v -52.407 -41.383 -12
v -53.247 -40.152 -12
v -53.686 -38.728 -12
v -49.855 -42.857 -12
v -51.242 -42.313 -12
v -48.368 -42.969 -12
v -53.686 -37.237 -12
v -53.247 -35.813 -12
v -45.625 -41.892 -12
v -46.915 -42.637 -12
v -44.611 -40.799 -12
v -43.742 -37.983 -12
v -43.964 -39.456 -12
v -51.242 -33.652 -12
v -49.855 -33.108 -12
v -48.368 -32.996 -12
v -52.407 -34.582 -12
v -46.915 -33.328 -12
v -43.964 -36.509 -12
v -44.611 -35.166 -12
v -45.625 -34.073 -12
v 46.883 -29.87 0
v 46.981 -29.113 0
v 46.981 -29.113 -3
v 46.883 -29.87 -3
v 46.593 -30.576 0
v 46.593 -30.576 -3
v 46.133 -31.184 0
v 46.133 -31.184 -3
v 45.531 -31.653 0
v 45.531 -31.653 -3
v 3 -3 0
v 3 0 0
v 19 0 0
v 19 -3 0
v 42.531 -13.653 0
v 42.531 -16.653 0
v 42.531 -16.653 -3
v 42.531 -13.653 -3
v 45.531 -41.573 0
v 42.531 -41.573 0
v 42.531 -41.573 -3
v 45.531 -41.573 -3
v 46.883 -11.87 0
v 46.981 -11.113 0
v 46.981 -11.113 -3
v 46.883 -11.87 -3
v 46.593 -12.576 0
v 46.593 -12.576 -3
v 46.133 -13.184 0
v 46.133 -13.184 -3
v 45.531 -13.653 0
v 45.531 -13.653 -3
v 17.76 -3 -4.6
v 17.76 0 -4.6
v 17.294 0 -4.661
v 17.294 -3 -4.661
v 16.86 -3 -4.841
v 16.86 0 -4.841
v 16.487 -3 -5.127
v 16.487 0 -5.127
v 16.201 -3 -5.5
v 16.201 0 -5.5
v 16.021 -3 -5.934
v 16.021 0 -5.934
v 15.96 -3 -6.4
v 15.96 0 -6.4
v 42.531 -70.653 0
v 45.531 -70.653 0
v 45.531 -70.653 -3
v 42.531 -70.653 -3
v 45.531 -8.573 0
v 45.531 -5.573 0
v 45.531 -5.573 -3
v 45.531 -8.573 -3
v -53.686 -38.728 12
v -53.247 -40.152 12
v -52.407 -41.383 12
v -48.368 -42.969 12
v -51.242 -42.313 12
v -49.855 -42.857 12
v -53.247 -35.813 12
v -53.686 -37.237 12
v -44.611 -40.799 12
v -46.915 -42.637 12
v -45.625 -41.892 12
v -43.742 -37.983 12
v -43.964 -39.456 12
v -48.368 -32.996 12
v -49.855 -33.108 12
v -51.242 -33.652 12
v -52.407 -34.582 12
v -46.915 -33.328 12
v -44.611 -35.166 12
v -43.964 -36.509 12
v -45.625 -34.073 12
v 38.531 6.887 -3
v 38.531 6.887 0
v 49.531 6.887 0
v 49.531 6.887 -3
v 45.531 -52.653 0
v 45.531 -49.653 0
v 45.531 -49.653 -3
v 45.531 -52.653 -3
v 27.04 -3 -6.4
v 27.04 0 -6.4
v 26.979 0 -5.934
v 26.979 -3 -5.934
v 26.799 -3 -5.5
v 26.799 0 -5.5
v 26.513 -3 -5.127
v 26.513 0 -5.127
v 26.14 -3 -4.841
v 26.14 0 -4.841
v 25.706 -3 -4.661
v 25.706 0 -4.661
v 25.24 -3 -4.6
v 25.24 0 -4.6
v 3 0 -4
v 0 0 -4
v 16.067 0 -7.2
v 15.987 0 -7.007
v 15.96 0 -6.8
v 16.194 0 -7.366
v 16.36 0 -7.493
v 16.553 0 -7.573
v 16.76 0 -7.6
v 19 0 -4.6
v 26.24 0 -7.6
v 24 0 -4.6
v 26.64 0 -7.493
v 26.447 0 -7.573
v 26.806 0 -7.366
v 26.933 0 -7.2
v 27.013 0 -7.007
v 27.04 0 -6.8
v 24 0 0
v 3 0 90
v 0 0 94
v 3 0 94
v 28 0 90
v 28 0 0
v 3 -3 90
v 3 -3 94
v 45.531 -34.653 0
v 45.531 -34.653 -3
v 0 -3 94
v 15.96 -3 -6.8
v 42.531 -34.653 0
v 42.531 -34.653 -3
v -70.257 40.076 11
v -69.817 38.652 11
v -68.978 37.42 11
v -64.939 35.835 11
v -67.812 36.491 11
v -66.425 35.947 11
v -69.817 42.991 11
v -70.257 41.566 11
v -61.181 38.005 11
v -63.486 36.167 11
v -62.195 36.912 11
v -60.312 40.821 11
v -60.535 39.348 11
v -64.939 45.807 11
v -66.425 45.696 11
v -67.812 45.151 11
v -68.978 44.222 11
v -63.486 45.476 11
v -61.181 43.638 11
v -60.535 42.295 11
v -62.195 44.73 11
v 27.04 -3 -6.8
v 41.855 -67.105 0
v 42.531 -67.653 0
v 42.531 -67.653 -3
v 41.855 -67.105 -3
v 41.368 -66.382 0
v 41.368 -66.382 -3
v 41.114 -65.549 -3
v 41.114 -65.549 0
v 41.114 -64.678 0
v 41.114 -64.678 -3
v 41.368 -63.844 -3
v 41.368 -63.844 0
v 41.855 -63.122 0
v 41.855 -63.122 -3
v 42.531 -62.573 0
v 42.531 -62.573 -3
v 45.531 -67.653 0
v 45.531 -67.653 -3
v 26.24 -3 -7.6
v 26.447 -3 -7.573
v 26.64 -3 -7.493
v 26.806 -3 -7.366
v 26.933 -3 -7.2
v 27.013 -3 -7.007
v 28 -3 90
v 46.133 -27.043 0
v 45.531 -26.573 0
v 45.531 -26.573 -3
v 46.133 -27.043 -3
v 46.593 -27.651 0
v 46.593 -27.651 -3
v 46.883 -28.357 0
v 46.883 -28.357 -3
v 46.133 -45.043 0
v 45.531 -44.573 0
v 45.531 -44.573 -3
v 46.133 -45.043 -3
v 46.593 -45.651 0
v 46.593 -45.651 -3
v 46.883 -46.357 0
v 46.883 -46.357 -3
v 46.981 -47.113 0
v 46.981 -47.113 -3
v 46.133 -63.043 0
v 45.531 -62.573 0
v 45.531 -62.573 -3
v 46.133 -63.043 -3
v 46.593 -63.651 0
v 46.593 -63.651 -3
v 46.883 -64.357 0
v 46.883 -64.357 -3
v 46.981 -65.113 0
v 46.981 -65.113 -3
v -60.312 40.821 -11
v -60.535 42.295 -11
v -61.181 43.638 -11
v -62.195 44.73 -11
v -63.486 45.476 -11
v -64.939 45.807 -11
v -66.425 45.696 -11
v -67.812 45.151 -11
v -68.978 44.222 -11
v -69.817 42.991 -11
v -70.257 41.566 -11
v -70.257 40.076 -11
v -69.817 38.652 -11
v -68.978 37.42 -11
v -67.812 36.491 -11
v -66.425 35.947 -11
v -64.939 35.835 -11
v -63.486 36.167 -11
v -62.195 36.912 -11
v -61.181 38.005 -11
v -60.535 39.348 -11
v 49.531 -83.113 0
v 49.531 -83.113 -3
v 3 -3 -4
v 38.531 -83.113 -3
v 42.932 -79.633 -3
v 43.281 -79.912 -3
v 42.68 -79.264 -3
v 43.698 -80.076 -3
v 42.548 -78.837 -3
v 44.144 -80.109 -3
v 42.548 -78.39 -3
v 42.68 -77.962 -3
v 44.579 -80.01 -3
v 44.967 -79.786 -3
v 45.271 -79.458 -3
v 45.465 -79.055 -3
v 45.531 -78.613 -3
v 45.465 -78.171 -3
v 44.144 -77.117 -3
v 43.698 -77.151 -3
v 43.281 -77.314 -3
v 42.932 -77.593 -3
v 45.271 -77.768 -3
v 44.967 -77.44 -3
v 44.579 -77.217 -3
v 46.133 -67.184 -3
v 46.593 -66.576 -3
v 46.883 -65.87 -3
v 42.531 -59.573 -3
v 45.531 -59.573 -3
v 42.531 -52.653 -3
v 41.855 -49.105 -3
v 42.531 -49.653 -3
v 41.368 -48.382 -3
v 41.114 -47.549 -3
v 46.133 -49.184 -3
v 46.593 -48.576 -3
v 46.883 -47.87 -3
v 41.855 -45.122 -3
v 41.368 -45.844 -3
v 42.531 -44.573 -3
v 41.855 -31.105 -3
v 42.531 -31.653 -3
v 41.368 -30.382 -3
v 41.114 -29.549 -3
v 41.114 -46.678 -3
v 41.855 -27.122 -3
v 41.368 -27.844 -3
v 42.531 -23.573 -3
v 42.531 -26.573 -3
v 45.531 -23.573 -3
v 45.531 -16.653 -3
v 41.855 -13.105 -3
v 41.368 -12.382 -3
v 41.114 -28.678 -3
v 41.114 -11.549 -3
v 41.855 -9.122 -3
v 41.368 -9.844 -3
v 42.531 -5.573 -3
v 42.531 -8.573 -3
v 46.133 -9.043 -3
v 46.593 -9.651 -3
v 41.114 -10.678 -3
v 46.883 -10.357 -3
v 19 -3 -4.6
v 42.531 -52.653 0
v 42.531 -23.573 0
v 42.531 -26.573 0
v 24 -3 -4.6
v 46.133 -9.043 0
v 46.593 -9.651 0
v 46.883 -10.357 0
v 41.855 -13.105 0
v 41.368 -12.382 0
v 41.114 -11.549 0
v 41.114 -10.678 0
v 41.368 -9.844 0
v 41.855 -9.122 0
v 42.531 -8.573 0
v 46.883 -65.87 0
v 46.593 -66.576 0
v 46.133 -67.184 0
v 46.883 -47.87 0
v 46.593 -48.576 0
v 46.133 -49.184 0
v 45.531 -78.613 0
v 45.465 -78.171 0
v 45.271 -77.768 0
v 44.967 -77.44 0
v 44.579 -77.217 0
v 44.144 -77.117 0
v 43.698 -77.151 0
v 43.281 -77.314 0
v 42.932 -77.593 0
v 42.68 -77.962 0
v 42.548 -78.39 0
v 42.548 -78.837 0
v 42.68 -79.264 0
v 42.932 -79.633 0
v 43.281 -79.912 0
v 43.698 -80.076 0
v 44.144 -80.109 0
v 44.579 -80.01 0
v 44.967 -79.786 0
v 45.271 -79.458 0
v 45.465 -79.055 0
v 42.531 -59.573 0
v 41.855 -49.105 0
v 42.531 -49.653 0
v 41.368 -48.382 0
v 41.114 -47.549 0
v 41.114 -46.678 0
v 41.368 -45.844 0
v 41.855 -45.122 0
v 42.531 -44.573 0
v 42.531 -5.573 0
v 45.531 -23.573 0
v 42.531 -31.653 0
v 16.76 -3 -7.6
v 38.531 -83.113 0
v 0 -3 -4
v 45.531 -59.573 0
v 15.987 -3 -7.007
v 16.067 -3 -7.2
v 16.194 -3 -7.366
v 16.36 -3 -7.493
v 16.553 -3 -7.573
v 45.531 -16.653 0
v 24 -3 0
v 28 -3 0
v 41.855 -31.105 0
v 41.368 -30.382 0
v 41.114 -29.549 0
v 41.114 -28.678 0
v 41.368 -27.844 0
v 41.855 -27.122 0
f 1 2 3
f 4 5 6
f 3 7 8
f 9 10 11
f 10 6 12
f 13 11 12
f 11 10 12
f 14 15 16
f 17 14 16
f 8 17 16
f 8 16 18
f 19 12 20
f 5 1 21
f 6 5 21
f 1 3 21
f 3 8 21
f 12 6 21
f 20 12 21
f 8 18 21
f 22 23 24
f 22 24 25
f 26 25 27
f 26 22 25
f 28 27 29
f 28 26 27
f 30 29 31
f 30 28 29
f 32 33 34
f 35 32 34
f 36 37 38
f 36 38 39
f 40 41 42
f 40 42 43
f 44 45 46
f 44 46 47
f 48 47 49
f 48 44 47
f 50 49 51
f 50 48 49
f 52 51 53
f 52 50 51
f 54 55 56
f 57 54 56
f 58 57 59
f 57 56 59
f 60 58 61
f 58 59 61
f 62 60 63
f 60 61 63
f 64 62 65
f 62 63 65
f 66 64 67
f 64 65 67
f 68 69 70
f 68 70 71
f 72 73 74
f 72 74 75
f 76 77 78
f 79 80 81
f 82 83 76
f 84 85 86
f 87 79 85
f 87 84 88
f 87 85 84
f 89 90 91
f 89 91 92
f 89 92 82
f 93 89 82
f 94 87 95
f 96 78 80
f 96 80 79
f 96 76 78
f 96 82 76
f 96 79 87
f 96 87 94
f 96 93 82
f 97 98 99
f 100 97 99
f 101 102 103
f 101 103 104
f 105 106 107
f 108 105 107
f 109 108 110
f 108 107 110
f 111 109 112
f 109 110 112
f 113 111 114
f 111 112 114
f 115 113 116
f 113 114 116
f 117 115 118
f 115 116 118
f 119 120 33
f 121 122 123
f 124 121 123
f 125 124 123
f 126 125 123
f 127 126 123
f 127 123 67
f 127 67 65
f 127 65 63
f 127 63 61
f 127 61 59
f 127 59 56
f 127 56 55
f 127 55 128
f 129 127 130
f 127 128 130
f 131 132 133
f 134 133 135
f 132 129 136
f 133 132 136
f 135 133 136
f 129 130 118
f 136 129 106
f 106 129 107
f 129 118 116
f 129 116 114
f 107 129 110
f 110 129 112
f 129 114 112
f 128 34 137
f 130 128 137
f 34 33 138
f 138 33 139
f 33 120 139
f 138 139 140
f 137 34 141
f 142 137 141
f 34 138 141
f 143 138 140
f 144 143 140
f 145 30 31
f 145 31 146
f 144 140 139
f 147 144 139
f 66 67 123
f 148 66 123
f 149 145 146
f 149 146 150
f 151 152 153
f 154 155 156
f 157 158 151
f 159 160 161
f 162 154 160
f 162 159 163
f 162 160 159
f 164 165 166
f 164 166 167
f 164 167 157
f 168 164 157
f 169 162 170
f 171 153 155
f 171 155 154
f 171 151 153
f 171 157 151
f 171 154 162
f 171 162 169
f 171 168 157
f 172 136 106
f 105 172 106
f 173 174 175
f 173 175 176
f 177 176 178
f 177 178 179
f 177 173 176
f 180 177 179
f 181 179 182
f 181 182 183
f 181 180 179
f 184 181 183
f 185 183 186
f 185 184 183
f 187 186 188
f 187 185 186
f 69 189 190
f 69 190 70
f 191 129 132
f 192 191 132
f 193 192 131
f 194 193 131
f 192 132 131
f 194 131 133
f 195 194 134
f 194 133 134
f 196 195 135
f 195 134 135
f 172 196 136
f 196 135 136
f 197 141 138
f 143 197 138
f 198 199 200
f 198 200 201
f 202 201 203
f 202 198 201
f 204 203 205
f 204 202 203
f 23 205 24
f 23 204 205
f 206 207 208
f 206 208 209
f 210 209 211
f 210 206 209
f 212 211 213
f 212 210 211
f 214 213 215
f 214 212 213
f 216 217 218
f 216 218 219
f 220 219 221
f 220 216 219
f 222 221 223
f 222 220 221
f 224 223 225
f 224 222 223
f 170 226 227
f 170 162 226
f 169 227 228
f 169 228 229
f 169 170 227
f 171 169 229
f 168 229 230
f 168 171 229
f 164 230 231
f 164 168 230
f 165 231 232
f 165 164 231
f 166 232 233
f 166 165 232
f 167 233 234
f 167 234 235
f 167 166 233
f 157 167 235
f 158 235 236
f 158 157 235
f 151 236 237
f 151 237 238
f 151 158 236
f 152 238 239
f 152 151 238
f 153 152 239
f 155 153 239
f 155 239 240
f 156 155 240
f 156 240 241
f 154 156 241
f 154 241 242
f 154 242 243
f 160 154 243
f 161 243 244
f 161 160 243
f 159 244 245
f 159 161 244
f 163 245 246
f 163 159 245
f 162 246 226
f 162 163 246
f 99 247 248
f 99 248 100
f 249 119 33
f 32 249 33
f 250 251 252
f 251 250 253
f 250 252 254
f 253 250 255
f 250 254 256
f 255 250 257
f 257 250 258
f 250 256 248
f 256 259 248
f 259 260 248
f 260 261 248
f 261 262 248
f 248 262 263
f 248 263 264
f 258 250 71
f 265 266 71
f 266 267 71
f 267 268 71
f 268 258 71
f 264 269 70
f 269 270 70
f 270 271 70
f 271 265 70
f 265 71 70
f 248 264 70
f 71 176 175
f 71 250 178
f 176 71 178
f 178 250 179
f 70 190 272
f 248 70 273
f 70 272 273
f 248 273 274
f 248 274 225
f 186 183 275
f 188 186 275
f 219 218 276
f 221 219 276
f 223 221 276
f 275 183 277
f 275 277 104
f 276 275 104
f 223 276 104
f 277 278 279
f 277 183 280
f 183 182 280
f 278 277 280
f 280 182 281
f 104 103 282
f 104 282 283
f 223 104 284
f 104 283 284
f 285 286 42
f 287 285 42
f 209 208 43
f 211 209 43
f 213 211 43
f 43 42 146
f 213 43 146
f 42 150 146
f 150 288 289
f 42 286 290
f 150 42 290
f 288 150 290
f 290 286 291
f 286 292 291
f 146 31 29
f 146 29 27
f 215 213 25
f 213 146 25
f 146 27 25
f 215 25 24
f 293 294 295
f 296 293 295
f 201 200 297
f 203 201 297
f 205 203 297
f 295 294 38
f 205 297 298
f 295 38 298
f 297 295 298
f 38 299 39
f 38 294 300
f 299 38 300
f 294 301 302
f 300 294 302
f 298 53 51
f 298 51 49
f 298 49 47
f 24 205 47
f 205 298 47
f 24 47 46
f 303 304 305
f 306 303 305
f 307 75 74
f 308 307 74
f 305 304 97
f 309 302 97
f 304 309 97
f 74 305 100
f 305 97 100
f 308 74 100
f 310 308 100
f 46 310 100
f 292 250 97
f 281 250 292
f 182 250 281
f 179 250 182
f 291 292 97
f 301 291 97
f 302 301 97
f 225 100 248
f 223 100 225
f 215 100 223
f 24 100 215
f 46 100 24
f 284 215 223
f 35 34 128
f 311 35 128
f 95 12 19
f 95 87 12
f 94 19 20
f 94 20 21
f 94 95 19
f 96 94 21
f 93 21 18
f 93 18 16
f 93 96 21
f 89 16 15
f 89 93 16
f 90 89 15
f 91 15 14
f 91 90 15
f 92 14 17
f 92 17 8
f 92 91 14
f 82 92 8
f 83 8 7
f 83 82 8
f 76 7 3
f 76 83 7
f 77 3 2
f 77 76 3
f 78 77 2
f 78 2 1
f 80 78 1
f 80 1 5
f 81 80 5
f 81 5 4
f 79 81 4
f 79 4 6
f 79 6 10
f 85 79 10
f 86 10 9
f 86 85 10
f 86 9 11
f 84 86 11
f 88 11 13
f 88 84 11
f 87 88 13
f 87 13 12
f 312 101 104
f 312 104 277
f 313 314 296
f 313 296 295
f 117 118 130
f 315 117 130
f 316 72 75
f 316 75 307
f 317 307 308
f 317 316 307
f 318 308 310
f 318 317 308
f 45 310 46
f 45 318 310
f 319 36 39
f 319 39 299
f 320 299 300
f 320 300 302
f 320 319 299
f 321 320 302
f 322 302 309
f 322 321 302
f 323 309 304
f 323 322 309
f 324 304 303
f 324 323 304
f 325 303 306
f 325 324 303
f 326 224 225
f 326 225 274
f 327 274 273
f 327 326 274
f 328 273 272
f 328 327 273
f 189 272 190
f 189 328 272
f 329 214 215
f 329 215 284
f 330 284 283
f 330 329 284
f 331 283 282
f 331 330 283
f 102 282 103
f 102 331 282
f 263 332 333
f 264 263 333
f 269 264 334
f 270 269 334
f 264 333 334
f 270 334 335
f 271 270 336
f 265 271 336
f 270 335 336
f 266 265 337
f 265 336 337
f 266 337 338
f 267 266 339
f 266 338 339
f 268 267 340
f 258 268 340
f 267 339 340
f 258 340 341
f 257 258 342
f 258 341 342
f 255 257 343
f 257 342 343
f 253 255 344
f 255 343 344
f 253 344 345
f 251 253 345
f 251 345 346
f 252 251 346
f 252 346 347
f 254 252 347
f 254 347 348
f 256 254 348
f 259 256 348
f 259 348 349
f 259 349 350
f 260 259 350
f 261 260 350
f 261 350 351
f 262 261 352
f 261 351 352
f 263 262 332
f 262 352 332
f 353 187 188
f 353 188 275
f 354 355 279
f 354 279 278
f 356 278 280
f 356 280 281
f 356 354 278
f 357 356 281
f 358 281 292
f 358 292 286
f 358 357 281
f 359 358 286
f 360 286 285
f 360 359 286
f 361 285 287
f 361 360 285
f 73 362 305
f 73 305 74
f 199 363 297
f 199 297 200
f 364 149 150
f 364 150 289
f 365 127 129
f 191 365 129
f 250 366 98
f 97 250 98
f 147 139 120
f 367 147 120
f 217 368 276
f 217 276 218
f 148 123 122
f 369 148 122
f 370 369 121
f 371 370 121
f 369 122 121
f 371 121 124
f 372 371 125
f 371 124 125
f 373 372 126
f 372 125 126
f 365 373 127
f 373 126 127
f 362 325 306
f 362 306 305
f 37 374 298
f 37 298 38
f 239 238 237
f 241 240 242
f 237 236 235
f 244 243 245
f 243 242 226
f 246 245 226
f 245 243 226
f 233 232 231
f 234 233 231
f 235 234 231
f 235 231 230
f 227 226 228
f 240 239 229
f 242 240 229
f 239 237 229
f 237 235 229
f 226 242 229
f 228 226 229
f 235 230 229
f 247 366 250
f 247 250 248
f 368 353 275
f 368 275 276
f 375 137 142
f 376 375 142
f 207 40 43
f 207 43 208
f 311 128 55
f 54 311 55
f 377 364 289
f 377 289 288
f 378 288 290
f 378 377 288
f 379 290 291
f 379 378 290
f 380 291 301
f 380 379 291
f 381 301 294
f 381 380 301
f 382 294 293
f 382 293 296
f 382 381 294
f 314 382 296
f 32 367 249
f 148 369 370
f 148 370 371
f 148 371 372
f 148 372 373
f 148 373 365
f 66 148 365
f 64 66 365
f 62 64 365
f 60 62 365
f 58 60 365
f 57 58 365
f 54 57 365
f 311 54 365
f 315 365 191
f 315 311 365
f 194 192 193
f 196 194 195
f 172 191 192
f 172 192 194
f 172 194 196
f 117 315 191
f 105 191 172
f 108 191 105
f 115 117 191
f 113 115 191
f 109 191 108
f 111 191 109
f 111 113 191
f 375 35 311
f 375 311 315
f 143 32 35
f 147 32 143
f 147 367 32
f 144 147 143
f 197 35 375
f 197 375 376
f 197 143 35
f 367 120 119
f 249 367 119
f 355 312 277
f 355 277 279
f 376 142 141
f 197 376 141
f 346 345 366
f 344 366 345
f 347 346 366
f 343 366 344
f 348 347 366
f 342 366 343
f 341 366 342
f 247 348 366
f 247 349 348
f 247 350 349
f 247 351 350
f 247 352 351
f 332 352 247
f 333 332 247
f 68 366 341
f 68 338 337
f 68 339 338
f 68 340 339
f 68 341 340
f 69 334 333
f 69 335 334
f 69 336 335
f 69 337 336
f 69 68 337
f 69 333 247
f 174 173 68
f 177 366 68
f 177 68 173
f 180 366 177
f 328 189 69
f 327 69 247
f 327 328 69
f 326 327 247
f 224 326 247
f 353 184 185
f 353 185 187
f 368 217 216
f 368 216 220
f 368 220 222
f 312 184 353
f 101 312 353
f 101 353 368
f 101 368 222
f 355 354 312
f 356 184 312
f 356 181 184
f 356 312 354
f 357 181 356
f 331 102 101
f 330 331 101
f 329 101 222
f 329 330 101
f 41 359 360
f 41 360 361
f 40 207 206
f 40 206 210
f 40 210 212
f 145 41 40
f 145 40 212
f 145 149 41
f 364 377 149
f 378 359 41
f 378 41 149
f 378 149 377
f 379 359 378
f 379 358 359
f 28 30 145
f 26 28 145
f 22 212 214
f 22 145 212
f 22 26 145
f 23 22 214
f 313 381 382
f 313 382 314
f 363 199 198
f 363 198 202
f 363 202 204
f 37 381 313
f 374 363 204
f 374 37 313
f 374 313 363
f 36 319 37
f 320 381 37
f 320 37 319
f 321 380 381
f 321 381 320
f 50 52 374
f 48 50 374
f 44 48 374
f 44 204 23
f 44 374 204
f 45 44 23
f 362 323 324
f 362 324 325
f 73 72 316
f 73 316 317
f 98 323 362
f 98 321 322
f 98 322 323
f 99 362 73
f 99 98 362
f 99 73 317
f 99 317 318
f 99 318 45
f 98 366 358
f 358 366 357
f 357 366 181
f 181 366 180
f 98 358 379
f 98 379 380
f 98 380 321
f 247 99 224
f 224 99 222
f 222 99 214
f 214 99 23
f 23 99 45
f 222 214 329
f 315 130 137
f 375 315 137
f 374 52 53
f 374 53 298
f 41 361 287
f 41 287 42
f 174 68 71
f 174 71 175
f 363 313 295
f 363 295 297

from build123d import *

# Parameters (mm, degrees)
F2_DEPTH = 3
F1_W     = 11
F1_H     = 90
F1_R     = 1.5
F3_DEPTH = 3
F4_R     = 5
F5_DEPTH = 11
F6_R     = 5
F7_DEPTH = 12
F8_W     = 3
F8_H     = 4
F9_DEPTH = 3


with BuildPart() as f2:
    # F0 (on Front) → F2 (new body)
    with BuildSketch(Plane.XZ):
        with BuildLine():
            Line((0, 90), (0, 0))
            Line((0, 0), (0, -4))
            Line((0, -4), (3, -4))
            Line((3, -4), (3, 0))
            Line((3, 0), (19, 0))
            Line((19, 0), (19, -4.6))
            Line((19, -4.6), (17.759825, -4.6))
            ThreePointArc((17.759825, -4.6), (16.4870327939, -5.1272077939), (15.959825, -6.4))
            Line((15.959825, -6.4), (15.959825, -6.8))
            ThreePointArc((15.959825, -6.8), (16.1941395751, -7.3656854249), (16.759825, -7.6))
            Line((16.759825, -7.6), (26.240175, -7.6))
            ThreePointArc((26.240175, -7.6), (26.8058604249, -7.3656854249), (27.040175, -6.8))
            Line((27.040175, -6.8), (27.040175, -6.4))
            ThreePointArc((27.040175, -6.4), (26.5129672061, -5.1272077939), (25.240175, -4.6))
            Line((25.240175, -4.6), (24, -4.6))
            Line((24, -4.6), (24, 0))
            Line((24, 0), (28, 0))
            Line((28, 0), (28, 90))
            Line((28, 90), (7, 90))
            Line((7, 90), (3, 90))
            Line((3, 90), (3, 94))
            Line((3, 94), (0, 94))
            Line((0, 94), (0, 90))
        make_face()
    extrude(amount=F2_DEPTH)

    # F8 (on face) → F9 (join, through all)
    with BuildSketch(Plane(origin=(0, 0, 0), x_dir=(0, -1, 0), z_dir=(-1, 0, 0))):
        with Locations((1.5, -2)):
            Rectangle(F8_W, F8_H)
        with Locations((1.5, 92)):
            Rectangle(F8_W, F8_H)
    extrude(amount=-F9_DEPTH)


with BuildPart() as f3:
    # F1 (on Top) → F3 (new body)
    with BuildSketch(Plane.XY):
        with Locations((44.0314322607, -38.1132309322)):
            Rectangle(F1_W, F1_H)
        with Locations((44.0314322607, -78.6132309322)):
            Circle(F1_R, mode=Mode.SUBTRACT)
        with BuildLine():
            ThreePointArc((45.5314322607, -62.5730537731), (46.5934139156, -63.650784352), (46.9814322607, -65.1132309322))
            ThreePointArc((46.9814322607, -65.1132309322), (46.5934139156, -66.5756775125), (45.5314322607, -67.6534080914))
            Line((45.5314322607, -67.6534080914), (45.5314322607, -70.6534080914))
            Line((45.5314322607, -70.6534080914), (42.5314322607, -70.6534080914))
            Line((42.5314322607, -70.6534080914), (42.5314322607, -67.6534080914))
            ThreePointArc((42.5314322607, -67.6534080914), (41.0814322607, -65.1132309322), (42.5314322607, -62.5730537731))
            Line((42.5314322607, -62.5730537731), (42.5314322607, -59.5730537731))
            Line((42.5314322607, -59.5730537731), (45.5314322607, -59.5730537731))
            Line((45.5314322607, -59.5730537731), (45.5314322607, -62.5730537731))
        make_face(mode=Mode.SUBTRACT)
        with BuildLine():
            ThreePointArc((45.5314322607, -44.5730537731), (46.5934139156, -45.650784352), (46.9814322607, -47.1132309322))
            ThreePointArc((46.9814322607, -47.1132309322), (46.5934139156, -48.5756775125), (45.5314322607, -49.6534080914))
            Line((45.5314322607, -49.6534080914), (45.5314322607, -52.6534080914))
            Line((45.5314322607, -52.6534080914), (42.5314322607, -52.6534080914))
            Line((42.5314322607, -52.6534080914), (42.5314322607, -49.6534080914))
            ThreePointArc((42.5314322607, -49.6534080914), (41.0814322607, -47.1132309322), (42.5314322607, -44.5730537731))
            Line((42.5314322607, -44.5730537731), (42.5314322607, -41.5730537731))
            Line((42.5314322607, -41.5730537731), (45.5314322607, -41.5730537731))
            Line((45.5314322607, -41.5730537731), (45.5314322607, -44.5730537731))
        make_face(mode=Mode.SUBTRACT)
        with BuildLine():
            ThreePointArc((45.5314322607, -26.5730537731), (46.5934139156, -27.650784352), (46.9814322607, -29.1132309322))
            ThreePointArc((46.9814322607, -29.1132309322), (46.5934139156, -30.5756775125), (45.5314322607, -31.6534080914))
            Line((45.5314322607, -31.6534080914), (45.5314322607, -34.6534080914))
            Line((45.5314322607, -34.6534080914), (42.5314322607, -34.6534080914))
            Line((42.5314322607, -34.6534080914), (42.5314322607, -31.6534080914))
            ThreePointArc((42.5314322607, -31.6534080914), (41.0814322607, -29.1132309322), (42.5314322607, -26.5730537731))
            Line((42.5314322607, -26.5730537731), (42.5314322607, -23.5730537731))
            Line((42.5314322607, -23.5730537731), (45.5314322607, -23.5730537731))
            Line((45.5314322607, -23.5730537731), (45.5314322607, -26.5730537731))
        make_face(mode=Mode.SUBTRACT)
        with BuildLine():
            ThreePointArc((45.5314322607, -8.5730537731), (46.5934139156, -9.650784352), (46.9814322607, -11.1132309322))
            ThreePointArc((46.9814322607, -11.1132309322), (46.5934139156, -12.5756775125), (45.5314322607, -13.6534080914))
            Line((45.5314322607, -13.6534080914), (45.5314322607, -16.6534080914))
            Line((45.5314322607, -16.6534080914), (42.5314322607, -16.6534080914))
            Line((42.5314322607, -16.6534080914), (42.5314322607, -13.6534080914))
            ThreePointArc((42.5314322607, -13.6534080914), (41.0814322607, -11.1132309322), (42.5314322607, -8.5730537731))
            Line((42.5314322607, -8.5730537731), (42.5314322607, -5.5730537731))
            Line((42.5314322607, -5.5730537731), (45.5314322607, -5.5730537731))
            Line((45.5314322607, -5.5730537731), (45.5314322607, -8.5730537731))
        make_face(mode=Mode.SUBTRACT)
    extrude(amount=-F3_DEPTH)


with BuildPart() as f5:
    # F4 (on Top) → F5 (new body, symmetric)
    with BuildSketch(Plane.XY):
        with Locations((-65.3124973178, 40.821287781)):
            Circle(F4_R)
    extrude(amount=F5_DEPTH, both=True)


with BuildPart() as f7:
    # F6 (on Top) → F7 (new body, symmetric)
    with BuildSketch(Plane.XY):
        with Locations((-48.7421378493, -37.9825122654)):
            Circle(F6_R)
    extrude(amount=F7_DEPTH, both=True)


solid = Compound([f2.part, f3.part, f5.part, f7.part])
